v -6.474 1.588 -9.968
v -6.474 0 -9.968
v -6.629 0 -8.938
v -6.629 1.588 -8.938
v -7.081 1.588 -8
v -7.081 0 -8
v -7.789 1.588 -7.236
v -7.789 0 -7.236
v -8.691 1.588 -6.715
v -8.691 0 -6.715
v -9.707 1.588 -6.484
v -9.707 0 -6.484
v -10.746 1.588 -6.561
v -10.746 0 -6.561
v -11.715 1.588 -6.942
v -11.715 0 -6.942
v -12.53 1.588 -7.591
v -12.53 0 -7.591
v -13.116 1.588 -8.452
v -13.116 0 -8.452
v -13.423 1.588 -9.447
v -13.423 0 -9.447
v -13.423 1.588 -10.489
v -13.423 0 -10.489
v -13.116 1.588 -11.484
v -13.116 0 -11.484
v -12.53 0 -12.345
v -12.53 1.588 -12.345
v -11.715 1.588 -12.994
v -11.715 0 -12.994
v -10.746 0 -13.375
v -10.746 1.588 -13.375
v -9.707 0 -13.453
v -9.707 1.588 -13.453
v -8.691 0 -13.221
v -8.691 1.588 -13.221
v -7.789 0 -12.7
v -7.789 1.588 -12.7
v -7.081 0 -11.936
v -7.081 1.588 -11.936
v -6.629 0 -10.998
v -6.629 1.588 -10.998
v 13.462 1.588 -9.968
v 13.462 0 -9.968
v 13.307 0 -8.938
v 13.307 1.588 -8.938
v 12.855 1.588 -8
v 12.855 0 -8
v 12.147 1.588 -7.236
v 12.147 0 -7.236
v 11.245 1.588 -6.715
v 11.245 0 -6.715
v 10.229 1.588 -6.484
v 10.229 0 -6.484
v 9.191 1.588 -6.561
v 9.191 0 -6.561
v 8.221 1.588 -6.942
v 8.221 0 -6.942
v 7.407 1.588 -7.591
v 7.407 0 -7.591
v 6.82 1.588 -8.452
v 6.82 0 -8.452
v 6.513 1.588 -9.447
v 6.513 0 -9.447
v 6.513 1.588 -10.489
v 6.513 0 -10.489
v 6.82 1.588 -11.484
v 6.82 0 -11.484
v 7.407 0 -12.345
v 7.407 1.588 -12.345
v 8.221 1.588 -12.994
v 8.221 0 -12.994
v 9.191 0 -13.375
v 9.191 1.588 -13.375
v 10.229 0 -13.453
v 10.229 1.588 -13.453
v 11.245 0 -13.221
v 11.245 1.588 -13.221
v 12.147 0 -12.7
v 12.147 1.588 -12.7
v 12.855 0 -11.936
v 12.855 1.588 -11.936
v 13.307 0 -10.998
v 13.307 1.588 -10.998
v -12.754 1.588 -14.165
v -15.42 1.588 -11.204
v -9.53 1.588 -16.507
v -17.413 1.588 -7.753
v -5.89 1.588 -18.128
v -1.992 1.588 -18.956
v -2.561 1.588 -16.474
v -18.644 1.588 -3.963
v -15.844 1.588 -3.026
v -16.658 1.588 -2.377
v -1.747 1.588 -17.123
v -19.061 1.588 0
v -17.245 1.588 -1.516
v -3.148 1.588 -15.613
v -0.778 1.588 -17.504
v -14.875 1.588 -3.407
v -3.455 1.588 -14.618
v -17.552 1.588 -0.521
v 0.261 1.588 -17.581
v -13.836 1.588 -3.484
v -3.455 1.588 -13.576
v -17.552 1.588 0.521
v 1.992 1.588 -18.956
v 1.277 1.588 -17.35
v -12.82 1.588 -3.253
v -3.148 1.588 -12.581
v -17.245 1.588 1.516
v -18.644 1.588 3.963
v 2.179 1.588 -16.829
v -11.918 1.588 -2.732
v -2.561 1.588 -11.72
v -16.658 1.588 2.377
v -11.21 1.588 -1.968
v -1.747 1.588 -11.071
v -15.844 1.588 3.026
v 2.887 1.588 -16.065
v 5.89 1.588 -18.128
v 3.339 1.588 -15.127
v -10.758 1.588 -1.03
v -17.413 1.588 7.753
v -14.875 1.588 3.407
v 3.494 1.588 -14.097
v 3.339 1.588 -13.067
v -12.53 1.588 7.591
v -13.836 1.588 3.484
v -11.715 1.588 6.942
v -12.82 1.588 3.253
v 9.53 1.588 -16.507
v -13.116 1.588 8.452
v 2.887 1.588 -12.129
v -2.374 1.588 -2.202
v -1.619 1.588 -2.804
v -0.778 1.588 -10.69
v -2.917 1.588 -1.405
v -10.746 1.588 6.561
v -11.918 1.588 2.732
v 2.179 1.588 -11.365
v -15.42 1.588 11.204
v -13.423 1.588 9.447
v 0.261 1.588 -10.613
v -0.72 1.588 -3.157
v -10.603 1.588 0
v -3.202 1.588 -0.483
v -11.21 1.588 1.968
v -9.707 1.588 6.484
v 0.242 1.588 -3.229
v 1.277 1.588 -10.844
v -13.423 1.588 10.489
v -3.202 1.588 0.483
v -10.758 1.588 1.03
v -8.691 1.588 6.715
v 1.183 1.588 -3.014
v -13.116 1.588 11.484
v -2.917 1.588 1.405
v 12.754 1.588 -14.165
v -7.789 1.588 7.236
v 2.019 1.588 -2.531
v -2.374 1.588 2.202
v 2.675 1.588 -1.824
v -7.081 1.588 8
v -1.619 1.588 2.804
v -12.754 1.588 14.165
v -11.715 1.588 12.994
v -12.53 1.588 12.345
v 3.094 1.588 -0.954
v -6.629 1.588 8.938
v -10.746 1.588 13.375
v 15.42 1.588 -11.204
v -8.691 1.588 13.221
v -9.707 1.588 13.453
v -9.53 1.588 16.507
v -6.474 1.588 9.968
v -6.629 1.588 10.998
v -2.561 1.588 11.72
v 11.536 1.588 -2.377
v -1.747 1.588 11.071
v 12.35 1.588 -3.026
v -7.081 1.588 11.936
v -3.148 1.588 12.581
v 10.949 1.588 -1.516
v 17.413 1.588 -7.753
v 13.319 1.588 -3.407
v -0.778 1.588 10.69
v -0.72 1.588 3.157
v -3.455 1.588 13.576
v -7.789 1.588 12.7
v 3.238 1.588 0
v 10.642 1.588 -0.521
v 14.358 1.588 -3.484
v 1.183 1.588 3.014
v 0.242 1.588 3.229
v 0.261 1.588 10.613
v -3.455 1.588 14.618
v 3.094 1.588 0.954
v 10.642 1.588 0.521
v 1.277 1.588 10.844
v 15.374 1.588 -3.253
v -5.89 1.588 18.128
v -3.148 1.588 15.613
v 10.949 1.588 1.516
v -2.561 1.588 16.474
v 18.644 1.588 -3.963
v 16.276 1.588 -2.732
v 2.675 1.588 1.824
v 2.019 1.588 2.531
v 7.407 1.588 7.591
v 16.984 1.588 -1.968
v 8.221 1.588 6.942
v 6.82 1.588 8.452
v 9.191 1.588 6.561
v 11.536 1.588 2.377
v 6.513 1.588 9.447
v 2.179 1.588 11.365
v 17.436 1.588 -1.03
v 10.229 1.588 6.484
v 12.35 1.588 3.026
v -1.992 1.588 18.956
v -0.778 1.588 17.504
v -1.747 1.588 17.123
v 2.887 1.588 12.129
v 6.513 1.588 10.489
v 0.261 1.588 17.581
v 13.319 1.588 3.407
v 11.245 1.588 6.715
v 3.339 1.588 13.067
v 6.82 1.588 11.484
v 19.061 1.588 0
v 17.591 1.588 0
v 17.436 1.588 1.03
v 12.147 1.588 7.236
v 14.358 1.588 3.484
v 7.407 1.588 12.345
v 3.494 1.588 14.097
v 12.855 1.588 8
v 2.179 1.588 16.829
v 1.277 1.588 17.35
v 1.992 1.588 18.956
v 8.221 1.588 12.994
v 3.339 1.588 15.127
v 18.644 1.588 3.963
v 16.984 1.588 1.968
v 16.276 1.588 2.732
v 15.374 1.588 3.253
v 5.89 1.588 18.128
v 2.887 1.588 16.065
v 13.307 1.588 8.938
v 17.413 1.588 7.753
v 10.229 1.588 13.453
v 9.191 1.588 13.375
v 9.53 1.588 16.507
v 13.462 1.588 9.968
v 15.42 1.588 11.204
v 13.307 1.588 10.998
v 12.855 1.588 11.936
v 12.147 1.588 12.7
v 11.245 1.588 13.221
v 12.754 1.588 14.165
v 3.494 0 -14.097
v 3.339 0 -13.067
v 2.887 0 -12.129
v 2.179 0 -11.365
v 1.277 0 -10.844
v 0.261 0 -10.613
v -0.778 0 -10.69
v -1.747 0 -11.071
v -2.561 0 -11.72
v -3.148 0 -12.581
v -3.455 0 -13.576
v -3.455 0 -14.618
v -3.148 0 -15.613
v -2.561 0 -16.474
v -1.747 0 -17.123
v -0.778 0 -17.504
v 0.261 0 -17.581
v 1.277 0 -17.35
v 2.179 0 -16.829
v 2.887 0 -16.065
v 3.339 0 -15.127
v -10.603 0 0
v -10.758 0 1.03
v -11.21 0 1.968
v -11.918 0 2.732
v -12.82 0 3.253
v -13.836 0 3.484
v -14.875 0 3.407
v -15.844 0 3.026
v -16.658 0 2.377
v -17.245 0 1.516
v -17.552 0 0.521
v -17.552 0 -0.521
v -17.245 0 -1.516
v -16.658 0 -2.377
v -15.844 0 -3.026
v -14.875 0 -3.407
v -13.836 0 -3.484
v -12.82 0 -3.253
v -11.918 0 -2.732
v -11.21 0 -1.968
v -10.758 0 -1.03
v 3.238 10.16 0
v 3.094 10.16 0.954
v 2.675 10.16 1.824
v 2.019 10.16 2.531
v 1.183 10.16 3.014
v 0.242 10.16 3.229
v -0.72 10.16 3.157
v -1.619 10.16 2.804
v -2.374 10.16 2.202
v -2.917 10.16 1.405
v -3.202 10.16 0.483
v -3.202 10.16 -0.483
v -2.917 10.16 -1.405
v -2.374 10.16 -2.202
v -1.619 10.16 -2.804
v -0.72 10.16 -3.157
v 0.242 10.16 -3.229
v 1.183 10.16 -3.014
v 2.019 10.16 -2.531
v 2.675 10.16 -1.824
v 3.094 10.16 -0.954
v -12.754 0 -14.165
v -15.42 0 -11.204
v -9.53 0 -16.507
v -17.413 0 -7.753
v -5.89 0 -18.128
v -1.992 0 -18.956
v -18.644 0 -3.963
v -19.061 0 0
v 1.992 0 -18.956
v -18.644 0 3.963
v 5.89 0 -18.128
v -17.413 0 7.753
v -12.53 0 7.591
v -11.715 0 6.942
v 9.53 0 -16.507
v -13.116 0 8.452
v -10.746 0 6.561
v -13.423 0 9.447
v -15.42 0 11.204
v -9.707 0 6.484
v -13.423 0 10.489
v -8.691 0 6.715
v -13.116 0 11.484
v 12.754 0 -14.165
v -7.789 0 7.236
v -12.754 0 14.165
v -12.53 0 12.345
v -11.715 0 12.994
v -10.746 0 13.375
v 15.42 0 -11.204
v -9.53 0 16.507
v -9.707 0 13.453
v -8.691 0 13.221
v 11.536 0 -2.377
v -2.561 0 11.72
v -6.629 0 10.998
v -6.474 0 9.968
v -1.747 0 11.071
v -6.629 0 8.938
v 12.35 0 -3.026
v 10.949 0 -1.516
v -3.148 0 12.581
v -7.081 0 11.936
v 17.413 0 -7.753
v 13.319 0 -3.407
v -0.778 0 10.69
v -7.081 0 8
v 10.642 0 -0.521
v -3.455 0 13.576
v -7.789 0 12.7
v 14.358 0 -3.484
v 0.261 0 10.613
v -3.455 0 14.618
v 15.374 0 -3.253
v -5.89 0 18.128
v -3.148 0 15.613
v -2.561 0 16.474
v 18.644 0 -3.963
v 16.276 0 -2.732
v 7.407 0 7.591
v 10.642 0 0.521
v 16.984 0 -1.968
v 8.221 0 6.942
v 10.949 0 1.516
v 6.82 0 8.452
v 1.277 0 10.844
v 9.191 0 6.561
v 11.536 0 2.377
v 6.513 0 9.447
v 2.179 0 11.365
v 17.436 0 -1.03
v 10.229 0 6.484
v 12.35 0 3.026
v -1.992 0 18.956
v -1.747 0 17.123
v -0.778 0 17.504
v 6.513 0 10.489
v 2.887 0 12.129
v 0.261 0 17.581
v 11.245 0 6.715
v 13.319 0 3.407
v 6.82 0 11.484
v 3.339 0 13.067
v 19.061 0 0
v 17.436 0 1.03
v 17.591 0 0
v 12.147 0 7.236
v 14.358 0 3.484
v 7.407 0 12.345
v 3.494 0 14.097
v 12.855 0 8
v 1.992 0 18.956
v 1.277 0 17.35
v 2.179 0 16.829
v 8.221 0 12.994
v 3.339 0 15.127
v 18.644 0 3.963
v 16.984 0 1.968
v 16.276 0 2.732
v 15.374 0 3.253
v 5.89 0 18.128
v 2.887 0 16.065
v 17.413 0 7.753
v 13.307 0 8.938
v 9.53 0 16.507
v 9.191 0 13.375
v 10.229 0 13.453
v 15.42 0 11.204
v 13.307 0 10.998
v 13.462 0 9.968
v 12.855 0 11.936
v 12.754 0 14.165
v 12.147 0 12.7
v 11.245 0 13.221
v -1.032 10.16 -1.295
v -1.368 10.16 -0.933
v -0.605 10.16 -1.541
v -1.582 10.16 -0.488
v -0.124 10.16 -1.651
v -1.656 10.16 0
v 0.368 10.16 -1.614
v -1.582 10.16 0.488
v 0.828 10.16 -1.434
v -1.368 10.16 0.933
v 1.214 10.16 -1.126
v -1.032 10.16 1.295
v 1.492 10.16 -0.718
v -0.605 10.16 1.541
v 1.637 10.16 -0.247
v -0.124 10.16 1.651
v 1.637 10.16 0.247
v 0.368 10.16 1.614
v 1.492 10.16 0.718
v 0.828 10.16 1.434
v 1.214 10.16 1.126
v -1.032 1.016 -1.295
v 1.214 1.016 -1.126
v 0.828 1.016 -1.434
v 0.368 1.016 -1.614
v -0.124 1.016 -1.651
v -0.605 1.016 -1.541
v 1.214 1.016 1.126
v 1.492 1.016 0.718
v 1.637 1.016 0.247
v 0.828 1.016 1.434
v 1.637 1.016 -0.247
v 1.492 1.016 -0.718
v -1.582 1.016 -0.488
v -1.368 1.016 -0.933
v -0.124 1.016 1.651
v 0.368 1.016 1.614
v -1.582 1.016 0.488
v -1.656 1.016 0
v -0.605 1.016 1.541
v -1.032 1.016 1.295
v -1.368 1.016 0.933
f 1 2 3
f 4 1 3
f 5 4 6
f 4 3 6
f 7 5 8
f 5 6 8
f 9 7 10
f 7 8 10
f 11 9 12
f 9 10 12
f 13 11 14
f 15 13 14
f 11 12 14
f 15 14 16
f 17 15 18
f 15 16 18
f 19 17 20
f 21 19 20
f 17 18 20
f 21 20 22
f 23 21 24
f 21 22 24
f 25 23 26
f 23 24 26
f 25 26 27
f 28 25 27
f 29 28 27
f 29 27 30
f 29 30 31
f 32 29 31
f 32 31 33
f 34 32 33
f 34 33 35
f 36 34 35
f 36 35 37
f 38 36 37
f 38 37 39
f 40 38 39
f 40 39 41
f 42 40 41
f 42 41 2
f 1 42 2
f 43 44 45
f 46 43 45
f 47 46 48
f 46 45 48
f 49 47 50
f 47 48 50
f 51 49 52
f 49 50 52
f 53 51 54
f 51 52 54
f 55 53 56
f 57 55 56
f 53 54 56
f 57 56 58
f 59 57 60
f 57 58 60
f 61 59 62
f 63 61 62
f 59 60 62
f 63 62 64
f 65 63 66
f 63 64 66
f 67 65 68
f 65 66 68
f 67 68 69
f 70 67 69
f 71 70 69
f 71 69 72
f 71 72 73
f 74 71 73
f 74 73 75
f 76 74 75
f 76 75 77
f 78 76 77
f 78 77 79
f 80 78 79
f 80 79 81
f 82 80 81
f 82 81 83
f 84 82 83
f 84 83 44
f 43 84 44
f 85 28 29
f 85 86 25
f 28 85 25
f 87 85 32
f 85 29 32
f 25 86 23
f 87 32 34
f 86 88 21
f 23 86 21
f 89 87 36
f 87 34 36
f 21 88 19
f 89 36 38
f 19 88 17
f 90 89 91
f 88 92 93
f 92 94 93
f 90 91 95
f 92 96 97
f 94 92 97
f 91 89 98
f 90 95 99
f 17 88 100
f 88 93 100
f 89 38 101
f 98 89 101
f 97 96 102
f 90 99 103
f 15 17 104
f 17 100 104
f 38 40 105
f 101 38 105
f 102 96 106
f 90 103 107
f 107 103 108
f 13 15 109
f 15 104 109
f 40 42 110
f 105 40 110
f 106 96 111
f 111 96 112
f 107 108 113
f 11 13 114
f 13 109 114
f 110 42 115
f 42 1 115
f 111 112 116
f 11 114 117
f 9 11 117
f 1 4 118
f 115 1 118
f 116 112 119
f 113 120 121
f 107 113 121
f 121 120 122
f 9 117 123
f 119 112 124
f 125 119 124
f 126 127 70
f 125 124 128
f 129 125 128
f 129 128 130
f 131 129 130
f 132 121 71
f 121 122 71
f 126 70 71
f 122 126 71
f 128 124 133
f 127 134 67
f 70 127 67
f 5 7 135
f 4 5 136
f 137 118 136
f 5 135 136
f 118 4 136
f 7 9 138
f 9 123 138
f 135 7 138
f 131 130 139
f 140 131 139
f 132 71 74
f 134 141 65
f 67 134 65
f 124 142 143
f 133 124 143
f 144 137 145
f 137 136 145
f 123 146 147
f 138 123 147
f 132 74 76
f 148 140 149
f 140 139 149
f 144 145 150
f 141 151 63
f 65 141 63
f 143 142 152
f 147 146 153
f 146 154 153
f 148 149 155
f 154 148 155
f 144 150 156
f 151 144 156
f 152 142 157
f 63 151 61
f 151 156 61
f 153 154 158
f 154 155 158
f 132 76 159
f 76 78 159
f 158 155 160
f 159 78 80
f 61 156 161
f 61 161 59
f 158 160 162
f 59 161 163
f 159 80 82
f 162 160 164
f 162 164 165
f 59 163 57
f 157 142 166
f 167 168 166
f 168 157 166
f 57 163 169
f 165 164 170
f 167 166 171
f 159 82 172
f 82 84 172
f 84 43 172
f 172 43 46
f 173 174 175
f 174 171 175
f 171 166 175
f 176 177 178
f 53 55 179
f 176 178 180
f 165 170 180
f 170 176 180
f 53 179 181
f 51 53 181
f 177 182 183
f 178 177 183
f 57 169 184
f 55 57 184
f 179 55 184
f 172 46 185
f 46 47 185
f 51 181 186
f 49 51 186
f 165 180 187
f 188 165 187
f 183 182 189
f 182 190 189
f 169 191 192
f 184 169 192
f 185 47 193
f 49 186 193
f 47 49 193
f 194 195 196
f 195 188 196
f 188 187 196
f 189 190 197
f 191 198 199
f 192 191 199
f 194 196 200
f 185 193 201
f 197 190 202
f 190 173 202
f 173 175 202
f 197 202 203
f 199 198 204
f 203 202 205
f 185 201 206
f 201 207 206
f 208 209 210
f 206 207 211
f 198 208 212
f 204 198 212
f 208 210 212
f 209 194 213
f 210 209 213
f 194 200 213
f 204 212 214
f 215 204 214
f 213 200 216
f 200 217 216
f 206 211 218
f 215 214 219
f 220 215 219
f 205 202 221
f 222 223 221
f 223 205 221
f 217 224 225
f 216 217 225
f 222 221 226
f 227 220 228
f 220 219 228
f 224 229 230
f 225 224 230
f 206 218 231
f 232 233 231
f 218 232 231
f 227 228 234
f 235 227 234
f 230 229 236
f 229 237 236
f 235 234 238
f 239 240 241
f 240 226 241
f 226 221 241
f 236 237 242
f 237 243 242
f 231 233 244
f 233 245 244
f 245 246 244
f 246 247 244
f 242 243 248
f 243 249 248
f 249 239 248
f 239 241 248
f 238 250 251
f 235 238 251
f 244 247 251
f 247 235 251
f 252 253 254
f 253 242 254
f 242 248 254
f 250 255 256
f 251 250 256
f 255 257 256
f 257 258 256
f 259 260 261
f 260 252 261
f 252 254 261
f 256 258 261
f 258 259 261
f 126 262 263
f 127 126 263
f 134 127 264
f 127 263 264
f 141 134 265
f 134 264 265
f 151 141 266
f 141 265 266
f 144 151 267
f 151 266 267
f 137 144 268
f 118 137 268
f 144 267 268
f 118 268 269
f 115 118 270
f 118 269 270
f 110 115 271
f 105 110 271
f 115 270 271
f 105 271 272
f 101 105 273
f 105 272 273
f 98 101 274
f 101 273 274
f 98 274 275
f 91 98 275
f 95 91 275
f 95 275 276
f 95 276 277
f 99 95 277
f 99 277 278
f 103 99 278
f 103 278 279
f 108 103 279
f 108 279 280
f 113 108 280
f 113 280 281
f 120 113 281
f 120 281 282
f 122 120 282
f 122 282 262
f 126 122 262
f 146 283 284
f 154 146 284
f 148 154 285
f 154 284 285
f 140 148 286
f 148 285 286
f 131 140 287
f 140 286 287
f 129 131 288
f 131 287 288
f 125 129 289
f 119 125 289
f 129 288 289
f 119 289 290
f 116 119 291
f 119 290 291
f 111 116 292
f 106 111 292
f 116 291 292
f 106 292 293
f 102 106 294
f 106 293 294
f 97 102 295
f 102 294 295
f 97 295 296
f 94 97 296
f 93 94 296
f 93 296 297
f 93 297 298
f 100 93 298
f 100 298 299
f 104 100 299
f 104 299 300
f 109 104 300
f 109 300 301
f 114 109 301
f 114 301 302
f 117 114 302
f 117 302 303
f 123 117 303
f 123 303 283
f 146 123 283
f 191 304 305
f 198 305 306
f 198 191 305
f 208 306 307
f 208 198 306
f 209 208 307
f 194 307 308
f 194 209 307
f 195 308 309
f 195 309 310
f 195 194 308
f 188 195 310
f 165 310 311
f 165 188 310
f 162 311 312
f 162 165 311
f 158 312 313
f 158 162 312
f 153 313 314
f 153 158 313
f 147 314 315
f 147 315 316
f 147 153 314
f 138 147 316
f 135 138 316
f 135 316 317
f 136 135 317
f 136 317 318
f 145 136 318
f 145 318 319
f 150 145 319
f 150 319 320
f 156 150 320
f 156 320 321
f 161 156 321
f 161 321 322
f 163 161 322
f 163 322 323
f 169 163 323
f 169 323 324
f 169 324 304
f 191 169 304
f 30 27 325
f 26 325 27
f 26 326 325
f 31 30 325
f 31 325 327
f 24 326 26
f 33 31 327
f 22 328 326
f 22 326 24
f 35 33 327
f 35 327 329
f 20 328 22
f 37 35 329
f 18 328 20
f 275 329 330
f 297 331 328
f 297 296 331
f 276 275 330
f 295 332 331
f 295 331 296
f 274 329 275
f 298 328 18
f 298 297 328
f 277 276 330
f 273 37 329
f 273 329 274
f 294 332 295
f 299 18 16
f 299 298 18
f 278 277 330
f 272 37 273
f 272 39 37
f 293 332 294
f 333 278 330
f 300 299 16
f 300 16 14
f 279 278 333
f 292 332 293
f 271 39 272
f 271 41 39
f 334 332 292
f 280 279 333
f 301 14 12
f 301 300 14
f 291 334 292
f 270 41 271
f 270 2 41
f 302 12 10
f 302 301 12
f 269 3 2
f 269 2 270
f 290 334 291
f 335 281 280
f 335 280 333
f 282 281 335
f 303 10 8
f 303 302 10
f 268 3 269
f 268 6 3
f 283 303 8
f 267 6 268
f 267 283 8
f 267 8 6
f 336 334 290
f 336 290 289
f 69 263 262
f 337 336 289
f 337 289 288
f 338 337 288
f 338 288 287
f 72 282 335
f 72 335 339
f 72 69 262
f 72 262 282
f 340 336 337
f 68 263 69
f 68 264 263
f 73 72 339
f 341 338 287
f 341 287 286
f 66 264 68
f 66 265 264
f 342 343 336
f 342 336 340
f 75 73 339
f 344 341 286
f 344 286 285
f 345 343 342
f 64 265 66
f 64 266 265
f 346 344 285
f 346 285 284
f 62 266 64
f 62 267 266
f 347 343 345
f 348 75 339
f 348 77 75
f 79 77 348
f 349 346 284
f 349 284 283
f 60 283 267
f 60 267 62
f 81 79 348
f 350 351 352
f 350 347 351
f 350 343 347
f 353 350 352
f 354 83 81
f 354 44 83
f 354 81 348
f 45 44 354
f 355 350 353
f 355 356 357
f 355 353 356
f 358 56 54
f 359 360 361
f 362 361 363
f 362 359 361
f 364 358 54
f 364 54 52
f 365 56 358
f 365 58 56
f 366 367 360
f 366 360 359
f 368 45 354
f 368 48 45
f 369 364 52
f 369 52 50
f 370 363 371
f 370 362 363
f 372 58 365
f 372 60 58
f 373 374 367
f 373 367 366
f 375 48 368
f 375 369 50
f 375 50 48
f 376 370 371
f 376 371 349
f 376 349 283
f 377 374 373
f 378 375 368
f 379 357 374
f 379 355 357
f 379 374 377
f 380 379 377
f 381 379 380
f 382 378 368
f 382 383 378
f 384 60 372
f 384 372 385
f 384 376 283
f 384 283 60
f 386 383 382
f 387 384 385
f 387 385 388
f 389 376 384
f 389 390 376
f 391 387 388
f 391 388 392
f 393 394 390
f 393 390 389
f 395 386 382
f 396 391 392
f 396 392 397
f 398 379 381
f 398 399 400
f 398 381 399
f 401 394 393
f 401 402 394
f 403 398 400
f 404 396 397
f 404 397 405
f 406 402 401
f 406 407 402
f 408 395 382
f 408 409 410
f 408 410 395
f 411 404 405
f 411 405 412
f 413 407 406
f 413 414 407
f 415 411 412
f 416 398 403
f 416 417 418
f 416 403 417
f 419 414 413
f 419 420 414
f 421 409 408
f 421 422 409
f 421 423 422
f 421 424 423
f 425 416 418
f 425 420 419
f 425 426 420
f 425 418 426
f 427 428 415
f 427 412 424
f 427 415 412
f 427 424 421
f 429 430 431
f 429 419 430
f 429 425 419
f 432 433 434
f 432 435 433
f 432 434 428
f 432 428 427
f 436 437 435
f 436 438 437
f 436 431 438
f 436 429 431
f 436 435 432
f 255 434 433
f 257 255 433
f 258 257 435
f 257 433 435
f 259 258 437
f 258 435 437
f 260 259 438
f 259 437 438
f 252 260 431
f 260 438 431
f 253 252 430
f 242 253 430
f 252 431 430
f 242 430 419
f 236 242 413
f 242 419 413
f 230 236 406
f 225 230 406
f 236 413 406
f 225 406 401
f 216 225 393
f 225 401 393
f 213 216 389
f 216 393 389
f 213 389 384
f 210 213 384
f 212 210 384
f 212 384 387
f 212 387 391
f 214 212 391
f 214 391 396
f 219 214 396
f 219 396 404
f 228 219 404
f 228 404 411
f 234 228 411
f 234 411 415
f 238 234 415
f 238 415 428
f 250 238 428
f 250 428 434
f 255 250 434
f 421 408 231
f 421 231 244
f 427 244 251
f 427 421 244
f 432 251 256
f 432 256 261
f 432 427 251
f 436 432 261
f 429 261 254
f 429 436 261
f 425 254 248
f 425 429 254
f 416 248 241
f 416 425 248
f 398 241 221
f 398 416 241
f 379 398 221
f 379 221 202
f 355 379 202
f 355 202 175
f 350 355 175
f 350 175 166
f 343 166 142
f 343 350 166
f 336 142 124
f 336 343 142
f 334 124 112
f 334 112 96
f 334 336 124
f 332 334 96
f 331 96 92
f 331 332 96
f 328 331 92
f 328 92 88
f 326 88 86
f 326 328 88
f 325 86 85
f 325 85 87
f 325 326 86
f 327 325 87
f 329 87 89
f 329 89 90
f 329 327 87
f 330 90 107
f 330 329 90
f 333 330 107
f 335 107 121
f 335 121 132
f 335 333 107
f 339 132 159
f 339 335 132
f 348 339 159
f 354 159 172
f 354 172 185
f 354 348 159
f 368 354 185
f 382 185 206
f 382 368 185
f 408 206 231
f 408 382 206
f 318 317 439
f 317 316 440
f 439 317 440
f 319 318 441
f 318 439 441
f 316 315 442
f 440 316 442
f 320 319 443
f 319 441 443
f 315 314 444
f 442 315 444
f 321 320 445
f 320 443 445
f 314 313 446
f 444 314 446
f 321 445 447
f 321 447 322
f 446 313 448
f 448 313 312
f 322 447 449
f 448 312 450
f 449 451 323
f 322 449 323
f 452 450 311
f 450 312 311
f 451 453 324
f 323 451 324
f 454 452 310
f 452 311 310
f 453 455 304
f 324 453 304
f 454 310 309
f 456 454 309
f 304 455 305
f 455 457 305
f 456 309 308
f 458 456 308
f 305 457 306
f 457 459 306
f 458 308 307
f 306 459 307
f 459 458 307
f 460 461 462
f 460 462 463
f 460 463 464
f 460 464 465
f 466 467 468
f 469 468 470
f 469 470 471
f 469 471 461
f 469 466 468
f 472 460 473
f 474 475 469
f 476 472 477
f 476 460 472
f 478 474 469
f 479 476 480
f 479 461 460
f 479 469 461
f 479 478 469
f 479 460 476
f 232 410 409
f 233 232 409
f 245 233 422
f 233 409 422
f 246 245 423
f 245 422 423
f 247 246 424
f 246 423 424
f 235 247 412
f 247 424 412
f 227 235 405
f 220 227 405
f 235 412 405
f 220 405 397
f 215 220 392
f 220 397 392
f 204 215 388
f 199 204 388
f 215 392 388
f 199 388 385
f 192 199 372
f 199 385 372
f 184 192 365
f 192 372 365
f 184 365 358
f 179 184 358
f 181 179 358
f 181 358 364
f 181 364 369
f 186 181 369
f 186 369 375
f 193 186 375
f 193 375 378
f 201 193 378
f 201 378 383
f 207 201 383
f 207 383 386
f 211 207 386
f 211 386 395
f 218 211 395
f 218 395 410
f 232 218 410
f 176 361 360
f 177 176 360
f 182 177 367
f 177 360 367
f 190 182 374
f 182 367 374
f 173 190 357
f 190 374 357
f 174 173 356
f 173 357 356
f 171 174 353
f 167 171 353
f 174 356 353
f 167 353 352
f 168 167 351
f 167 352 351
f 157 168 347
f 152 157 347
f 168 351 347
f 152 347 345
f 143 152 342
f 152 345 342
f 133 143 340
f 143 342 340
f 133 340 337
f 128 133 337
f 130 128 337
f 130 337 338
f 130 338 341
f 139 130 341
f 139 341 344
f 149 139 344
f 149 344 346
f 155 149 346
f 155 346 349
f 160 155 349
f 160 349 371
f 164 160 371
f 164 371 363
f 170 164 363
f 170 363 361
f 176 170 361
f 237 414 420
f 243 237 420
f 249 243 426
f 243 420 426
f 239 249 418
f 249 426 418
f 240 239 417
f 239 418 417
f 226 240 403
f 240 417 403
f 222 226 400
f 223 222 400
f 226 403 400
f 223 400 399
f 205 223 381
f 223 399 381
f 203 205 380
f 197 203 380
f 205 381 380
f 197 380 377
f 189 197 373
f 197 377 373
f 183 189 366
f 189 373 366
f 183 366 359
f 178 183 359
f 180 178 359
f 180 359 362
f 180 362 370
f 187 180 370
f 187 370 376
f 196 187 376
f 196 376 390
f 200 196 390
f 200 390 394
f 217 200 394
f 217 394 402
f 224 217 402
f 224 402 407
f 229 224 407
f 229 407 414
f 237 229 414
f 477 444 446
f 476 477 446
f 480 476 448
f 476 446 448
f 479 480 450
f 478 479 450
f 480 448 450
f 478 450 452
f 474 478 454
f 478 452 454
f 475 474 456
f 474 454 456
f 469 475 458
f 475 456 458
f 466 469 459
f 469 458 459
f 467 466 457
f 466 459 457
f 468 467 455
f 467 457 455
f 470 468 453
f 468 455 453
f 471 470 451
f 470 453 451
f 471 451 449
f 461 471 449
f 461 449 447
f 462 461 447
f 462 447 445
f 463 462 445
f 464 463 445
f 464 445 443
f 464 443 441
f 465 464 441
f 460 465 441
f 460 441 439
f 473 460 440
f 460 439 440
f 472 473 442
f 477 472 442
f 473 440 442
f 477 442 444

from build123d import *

# Parameters (mm, degrees)
F0_R     = 19.060581
F1_DEPTH = 1.5875
F2_R     = 3.494231
F3_DEPTH = 21.082
F4_R     = 3.237878
F5_DEPTH = 10.16
F6_R     = 1.655878
F7_DEPTH = 9.144


with BuildPart() as f1:
    # F0 (on Front) → F1 (new body)
    with BuildSketch(Plane.XZ):
        Circle(F0_R)
    extrude(amount=-F1_DEPTH)

    # F2 (on face) → F3 (cut)
    with BuildSketch(Plane.XZ):
        with Locations((0, 14.097)):
            Circle(F2_R)
        with Locations((-9.968085, 9.968085)):
            Circle(F2_R)
        with Locations((-14.097, 0)):
            Circle(F2_R)
        with Locations((-9.968085, -9.968085)):
            Circle(F2_R)
        with Locations((0, -14.097)):
            Circle(F2_R)
        with Locations((9.968085, -9.968085)):
            Circle(F2_R)
        with Locations((14.097, 0)):
            Circle(F2_R)
        with Locations((9.968085, 9.968085)):
            Circle(F2_R)
    extrude(amount=-F3_DEPTH, mode=Mode.SUBTRACT)

    # F4 (on Front) → F5 (join)
    with BuildSketch(Plane.XZ):
        Circle(F4_R)
    extrude(amount=-F5_DEPTH)

    # F6 (on face) → F7 (cut)
    with BuildSketch(Plane(origin=(0, 10.16, 0), x_dir=(-1, 0, 0), z_dir=(0, 1, 0))):
        Circle(F6_R)
    extrude(amount=-F7_DEPTH, mode=Mode.SUBTRACT)


solid = f1.part
